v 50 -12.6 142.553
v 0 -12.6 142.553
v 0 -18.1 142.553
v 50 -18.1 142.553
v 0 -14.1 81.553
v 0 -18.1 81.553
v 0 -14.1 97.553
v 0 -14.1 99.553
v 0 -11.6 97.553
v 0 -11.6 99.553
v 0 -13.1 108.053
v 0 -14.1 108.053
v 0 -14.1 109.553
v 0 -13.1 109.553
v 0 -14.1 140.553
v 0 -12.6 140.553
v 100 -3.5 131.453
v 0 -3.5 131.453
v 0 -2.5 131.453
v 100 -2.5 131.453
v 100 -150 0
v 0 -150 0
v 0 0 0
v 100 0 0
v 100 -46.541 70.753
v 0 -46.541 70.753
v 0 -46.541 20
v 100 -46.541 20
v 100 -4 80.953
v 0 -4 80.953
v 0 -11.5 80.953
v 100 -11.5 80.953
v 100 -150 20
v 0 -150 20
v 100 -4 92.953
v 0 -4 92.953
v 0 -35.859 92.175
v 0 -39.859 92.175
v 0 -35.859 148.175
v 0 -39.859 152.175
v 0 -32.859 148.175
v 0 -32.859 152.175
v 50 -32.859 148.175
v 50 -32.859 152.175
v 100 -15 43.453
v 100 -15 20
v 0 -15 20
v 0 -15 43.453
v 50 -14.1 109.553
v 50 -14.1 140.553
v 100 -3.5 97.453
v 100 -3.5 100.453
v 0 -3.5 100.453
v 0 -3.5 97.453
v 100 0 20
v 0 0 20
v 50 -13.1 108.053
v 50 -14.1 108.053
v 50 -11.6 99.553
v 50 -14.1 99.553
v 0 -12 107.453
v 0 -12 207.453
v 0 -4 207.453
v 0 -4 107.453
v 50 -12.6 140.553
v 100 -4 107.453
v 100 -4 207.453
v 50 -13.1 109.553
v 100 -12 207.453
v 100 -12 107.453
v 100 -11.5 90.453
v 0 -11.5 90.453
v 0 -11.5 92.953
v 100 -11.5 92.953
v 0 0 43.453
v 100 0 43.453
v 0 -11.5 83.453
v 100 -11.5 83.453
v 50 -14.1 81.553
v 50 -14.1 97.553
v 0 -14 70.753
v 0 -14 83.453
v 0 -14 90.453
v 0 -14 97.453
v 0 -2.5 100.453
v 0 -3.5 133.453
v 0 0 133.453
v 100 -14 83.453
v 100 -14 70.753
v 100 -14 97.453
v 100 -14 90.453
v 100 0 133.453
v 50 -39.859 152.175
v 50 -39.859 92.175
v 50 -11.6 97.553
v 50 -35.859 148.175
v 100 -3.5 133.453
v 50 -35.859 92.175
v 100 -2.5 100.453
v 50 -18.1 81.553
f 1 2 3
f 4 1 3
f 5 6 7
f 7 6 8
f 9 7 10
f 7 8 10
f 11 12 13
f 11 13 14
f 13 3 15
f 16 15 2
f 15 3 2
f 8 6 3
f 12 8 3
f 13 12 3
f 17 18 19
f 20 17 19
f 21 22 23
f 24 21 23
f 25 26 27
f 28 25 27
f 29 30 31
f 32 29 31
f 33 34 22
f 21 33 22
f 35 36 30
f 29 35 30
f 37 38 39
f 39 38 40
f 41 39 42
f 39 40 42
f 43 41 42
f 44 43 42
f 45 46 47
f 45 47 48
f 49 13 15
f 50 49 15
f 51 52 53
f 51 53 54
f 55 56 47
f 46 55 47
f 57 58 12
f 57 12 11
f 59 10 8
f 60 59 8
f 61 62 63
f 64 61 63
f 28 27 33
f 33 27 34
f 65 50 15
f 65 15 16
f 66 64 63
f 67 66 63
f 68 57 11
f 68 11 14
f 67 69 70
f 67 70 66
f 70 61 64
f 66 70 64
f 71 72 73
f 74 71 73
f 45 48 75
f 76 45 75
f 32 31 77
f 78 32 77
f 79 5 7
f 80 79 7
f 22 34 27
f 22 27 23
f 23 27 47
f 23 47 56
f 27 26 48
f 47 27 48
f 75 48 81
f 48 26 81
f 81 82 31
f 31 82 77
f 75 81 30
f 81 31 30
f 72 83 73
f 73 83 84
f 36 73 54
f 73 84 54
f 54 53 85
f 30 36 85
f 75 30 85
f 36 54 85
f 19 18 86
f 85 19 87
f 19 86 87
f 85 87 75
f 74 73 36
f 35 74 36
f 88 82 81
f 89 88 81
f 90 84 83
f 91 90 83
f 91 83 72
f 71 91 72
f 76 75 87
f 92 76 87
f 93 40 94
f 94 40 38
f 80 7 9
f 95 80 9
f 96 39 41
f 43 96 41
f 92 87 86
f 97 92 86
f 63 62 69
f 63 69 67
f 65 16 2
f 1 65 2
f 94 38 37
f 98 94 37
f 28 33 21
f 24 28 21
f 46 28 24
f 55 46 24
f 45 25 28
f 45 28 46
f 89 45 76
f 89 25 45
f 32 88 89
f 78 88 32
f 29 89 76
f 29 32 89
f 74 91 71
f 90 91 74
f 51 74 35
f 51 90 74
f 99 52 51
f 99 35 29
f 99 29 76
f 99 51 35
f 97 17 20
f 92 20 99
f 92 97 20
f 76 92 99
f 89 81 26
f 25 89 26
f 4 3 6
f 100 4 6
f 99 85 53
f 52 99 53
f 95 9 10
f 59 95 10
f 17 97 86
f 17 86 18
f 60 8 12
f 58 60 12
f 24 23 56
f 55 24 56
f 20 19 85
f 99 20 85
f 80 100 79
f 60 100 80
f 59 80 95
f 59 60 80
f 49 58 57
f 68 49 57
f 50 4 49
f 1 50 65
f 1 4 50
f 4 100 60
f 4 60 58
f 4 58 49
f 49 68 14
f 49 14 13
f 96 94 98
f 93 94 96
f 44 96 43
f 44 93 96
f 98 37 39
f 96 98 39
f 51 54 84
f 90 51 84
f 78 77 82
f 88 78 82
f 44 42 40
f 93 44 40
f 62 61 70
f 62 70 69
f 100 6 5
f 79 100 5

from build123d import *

# Parameters (mm, degrees)
F1_DEPTH = 100
F2_W     = 8
F2_H     = 100
F3_DEPTH = 100
F5_DEPTH = 50
F7_DEPTH = 50


with BuildPart() as f1:
    # F0 (on Right) → F1 (new body)
    with BuildSketch(Plane.YZ):
        Polygon((0, 43.452769), (0, 133.452769), (-3.5, 133.452769), (-3.5, 131.452769), (-2.5, 131.452769), (-2.5, 100.452769), (-3.5, 100.452769), (-3.5, 97.452769), (-14, 97.452769), (-14, 90.452769), (-11.5, 90.452769), (-11.5, 92.952769), (-4, 92.952769), (-4, 80.952769), (-11.5, 80.952769), (-11.5, 83.452769), (-14, 83.452769), (-14, 70.752769), (-46.540717, 70.752769), (-46.540717, 20), (-150, 20), (-150, 0), (0, 0), (0, 20), (-15, 20), (-15, 43.452769), align=None)
    extrude(amount=F1_DEPTH)


with BuildPart() as f3:
    # F2 (on Right) → F3 (new body)
    with BuildSketch(Plane.YZ):
        with Locations((-8, 157.452769)):
            Rectangle(F2_W, F2_H)
    extrude(amount=F3_DEPTH)


with BuildPart() as f5:
    # F4 (on Right) → F5 (new body)
    with BuildSketch(Plane.YZ):
        Polygon((-12.6, 140.552769), (-12.6, 142.552769), (-18.1, 142.552769), (-18.1, 81.552769), (-14.1, 81.552769), (-14.1, 97.552769), (-11.6, 97.552769), (-11.6, 99.552769), (-14.1, 99.552769), (-14.1, 108.052769), (-13.1, 108.052769), (-13.1, 109.552769), (-14.1, 109.552769), (-14.1, 140.552769), align=None)
    extrude(amount=F5_DEPTH)


with BuildPart() as f7:
    # F6 (on Right) → F7 (new body)
    with BuildSketch(Plane.YZ):
        Polygon((-39.859165, 92.174934), (-35.859165, 92.174934), (-35.859165, 148.174934), (-32.859165, 148.174934), (-32.859165, 152.174934), (-39.859165, 152.174934), align=None)
    extrude(amount=F7_DEPTH)


solid = Compound([f1.part, f3.part, f5.part, f7.part])
